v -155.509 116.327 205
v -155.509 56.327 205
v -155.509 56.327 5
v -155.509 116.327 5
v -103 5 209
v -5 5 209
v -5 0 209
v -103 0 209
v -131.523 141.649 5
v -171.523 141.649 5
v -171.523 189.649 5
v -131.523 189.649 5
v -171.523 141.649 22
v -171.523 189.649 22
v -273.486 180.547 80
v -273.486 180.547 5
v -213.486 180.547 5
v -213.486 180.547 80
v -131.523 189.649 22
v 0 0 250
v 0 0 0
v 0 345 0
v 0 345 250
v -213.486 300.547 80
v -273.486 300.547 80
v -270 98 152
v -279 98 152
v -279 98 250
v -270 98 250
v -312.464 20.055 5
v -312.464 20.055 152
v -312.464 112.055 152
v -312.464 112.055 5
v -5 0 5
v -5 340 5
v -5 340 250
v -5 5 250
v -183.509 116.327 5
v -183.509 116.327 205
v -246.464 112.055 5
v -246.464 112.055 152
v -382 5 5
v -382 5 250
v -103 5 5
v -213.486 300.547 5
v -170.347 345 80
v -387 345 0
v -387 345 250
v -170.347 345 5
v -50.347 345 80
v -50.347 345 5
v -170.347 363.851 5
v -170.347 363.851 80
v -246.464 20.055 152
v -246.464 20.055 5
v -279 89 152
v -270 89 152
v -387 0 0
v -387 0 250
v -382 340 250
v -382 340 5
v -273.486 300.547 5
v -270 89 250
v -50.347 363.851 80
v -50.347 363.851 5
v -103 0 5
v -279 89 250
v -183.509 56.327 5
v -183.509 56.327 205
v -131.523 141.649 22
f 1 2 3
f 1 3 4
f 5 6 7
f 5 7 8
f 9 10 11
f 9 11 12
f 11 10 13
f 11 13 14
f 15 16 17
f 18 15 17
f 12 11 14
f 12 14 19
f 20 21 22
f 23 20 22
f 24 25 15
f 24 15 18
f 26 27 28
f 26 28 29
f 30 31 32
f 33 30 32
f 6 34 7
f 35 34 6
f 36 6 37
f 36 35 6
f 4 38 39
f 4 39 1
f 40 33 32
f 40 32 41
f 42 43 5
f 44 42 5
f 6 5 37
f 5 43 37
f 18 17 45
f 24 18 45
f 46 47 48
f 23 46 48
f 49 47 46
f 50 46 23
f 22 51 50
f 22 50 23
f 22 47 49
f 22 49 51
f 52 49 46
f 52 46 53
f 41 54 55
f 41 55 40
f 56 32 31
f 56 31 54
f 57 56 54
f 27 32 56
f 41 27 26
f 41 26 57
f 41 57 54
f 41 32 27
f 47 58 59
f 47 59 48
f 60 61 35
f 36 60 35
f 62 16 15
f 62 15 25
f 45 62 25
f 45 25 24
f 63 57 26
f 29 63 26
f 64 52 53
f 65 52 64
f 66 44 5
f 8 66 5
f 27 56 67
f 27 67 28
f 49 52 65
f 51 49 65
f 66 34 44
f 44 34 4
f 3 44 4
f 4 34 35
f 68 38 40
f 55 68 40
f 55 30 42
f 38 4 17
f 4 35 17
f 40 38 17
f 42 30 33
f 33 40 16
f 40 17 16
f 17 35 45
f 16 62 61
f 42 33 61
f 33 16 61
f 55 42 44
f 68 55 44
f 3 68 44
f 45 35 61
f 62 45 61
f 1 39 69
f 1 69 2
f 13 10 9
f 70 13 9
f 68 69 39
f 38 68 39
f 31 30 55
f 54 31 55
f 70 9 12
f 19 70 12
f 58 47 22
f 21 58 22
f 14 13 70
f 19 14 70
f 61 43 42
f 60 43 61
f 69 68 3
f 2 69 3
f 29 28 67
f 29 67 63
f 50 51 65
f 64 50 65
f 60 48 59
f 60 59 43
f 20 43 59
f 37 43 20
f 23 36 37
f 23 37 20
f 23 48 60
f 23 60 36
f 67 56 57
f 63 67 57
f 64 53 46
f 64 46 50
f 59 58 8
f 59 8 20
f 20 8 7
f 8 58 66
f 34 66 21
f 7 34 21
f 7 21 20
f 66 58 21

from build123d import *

# Parameters (mm, degrees)
F0_W      = 387
F0_H      = 345
F1_DEPTH  = 250
F2_W      = 377
F2_H      = 335
F3_DEPTH  = 245
F4_W      = 98
F4_H      = 204
F5_DEPTH  = 25
F6_W      = 9
F6_H      = 9
F7_DEPTH  = 245
F8_W      = 60
F8_H      = 120
F9_DEPTH  = 75
F10_W     = 120
F10_H     = 23.8507700859
F11_DEPTH = 75
F12_W     = 40
F12_H     = 48
F13_DEPTH = 17
F14_W     = 28
F14_H     = 60
F15_DEPTH = 200
F16_W     = 66
F16_H     = 92
F16_W_2   = 9
F16_H_2   = 9
F17_DEPTH = 147


with BuildPart() as f1:
    # F0 (on Top) → F1 (new body)
    with BuildSketch(Plane.XY):
        with Locations((-193.5, 172.5)):
            Rectangle(F0_W, F0_H)
    extrude(amount=F1_DEPTH)

    # F2 (on face) → F3 (cut)
    with BuildSketch(Plane.XY.offset(250)):
        with Locations((-193.5, 172.5)):
            Rectangle(F2_W, F2_H)
    extrude(amount=-F3_DEPTH, mode=Mode.SUBTRACT)

    # F4 (on face) → F5 (cut)
    with BuildSketch(Plane(origin=(0, 5, 0), x_dir=(-1, 0, 0), z_dir=(0, 1, 0))):
        with Locations((54, 107)):
            Rectangle(F4_W, F4_H)
    extrude(amount=-F5_DEPTH, mode=Mode.SUBTRACT)

    # F6 (on face) → F7 (join)
    with BuildSketch(Plane.XY.offset(5)):
        with Locations((-274.5, 93.5)):
            Rectangle(F6_W, F6_H)
    extrude(amount=F7_DEPTH)

    # F8 (on face) → F9 (join)
    with BuildSketch(Plane.XY.offset(5)):
        with Locations((-243.4864774462, 240.5474260449)):
            Rectangle(F8_W, F8_H)
    extrude(amount=F9_DEPTH)

    # F10 (on face) → F11 (join)
    with BuildSketch(Plane.XY.offset(5)):
        with Locations((-110.3469633506, 351.925385043)):
            Rectangle(F10_W, F10_H)
    extrude(amount=F11_DEPTH)

    # F14 (on face) → F15 (join)
    with BuildSketch(Plane.XY.offset(5)):
        with Locations((-169.5094383758, 86.3268319517)):
            Rectangle(F14_W, F14_H)
    extrude(amount=F15_DEPTH)

    # F16 (on face) → F17 (join)
    with BuildSketch(Plane.XY.offset(5)):
        with Locations((-279.4643215769, 66.0552727059)):
            Rectangle(F16_W, F16_H)
        with Locations((-274.5, 93.5)):
            Rectangle(F16_W_2, F16_H_2, mode=Mode.SUBTRACT)
    extrude(amount=F17_DEPTH)


with BuildPart() as f13:
    # F12 (on face) → F13 (new body)
    with BuildSketch(Plane.XY.offset(5)):
        with Locations((-151.5231286956, 165.648837626)):
            Rectangle(F12_W, F12_H)
    extrude(amount=F13_DEPTH)


solid = Compound([f1.part, f13.part])
